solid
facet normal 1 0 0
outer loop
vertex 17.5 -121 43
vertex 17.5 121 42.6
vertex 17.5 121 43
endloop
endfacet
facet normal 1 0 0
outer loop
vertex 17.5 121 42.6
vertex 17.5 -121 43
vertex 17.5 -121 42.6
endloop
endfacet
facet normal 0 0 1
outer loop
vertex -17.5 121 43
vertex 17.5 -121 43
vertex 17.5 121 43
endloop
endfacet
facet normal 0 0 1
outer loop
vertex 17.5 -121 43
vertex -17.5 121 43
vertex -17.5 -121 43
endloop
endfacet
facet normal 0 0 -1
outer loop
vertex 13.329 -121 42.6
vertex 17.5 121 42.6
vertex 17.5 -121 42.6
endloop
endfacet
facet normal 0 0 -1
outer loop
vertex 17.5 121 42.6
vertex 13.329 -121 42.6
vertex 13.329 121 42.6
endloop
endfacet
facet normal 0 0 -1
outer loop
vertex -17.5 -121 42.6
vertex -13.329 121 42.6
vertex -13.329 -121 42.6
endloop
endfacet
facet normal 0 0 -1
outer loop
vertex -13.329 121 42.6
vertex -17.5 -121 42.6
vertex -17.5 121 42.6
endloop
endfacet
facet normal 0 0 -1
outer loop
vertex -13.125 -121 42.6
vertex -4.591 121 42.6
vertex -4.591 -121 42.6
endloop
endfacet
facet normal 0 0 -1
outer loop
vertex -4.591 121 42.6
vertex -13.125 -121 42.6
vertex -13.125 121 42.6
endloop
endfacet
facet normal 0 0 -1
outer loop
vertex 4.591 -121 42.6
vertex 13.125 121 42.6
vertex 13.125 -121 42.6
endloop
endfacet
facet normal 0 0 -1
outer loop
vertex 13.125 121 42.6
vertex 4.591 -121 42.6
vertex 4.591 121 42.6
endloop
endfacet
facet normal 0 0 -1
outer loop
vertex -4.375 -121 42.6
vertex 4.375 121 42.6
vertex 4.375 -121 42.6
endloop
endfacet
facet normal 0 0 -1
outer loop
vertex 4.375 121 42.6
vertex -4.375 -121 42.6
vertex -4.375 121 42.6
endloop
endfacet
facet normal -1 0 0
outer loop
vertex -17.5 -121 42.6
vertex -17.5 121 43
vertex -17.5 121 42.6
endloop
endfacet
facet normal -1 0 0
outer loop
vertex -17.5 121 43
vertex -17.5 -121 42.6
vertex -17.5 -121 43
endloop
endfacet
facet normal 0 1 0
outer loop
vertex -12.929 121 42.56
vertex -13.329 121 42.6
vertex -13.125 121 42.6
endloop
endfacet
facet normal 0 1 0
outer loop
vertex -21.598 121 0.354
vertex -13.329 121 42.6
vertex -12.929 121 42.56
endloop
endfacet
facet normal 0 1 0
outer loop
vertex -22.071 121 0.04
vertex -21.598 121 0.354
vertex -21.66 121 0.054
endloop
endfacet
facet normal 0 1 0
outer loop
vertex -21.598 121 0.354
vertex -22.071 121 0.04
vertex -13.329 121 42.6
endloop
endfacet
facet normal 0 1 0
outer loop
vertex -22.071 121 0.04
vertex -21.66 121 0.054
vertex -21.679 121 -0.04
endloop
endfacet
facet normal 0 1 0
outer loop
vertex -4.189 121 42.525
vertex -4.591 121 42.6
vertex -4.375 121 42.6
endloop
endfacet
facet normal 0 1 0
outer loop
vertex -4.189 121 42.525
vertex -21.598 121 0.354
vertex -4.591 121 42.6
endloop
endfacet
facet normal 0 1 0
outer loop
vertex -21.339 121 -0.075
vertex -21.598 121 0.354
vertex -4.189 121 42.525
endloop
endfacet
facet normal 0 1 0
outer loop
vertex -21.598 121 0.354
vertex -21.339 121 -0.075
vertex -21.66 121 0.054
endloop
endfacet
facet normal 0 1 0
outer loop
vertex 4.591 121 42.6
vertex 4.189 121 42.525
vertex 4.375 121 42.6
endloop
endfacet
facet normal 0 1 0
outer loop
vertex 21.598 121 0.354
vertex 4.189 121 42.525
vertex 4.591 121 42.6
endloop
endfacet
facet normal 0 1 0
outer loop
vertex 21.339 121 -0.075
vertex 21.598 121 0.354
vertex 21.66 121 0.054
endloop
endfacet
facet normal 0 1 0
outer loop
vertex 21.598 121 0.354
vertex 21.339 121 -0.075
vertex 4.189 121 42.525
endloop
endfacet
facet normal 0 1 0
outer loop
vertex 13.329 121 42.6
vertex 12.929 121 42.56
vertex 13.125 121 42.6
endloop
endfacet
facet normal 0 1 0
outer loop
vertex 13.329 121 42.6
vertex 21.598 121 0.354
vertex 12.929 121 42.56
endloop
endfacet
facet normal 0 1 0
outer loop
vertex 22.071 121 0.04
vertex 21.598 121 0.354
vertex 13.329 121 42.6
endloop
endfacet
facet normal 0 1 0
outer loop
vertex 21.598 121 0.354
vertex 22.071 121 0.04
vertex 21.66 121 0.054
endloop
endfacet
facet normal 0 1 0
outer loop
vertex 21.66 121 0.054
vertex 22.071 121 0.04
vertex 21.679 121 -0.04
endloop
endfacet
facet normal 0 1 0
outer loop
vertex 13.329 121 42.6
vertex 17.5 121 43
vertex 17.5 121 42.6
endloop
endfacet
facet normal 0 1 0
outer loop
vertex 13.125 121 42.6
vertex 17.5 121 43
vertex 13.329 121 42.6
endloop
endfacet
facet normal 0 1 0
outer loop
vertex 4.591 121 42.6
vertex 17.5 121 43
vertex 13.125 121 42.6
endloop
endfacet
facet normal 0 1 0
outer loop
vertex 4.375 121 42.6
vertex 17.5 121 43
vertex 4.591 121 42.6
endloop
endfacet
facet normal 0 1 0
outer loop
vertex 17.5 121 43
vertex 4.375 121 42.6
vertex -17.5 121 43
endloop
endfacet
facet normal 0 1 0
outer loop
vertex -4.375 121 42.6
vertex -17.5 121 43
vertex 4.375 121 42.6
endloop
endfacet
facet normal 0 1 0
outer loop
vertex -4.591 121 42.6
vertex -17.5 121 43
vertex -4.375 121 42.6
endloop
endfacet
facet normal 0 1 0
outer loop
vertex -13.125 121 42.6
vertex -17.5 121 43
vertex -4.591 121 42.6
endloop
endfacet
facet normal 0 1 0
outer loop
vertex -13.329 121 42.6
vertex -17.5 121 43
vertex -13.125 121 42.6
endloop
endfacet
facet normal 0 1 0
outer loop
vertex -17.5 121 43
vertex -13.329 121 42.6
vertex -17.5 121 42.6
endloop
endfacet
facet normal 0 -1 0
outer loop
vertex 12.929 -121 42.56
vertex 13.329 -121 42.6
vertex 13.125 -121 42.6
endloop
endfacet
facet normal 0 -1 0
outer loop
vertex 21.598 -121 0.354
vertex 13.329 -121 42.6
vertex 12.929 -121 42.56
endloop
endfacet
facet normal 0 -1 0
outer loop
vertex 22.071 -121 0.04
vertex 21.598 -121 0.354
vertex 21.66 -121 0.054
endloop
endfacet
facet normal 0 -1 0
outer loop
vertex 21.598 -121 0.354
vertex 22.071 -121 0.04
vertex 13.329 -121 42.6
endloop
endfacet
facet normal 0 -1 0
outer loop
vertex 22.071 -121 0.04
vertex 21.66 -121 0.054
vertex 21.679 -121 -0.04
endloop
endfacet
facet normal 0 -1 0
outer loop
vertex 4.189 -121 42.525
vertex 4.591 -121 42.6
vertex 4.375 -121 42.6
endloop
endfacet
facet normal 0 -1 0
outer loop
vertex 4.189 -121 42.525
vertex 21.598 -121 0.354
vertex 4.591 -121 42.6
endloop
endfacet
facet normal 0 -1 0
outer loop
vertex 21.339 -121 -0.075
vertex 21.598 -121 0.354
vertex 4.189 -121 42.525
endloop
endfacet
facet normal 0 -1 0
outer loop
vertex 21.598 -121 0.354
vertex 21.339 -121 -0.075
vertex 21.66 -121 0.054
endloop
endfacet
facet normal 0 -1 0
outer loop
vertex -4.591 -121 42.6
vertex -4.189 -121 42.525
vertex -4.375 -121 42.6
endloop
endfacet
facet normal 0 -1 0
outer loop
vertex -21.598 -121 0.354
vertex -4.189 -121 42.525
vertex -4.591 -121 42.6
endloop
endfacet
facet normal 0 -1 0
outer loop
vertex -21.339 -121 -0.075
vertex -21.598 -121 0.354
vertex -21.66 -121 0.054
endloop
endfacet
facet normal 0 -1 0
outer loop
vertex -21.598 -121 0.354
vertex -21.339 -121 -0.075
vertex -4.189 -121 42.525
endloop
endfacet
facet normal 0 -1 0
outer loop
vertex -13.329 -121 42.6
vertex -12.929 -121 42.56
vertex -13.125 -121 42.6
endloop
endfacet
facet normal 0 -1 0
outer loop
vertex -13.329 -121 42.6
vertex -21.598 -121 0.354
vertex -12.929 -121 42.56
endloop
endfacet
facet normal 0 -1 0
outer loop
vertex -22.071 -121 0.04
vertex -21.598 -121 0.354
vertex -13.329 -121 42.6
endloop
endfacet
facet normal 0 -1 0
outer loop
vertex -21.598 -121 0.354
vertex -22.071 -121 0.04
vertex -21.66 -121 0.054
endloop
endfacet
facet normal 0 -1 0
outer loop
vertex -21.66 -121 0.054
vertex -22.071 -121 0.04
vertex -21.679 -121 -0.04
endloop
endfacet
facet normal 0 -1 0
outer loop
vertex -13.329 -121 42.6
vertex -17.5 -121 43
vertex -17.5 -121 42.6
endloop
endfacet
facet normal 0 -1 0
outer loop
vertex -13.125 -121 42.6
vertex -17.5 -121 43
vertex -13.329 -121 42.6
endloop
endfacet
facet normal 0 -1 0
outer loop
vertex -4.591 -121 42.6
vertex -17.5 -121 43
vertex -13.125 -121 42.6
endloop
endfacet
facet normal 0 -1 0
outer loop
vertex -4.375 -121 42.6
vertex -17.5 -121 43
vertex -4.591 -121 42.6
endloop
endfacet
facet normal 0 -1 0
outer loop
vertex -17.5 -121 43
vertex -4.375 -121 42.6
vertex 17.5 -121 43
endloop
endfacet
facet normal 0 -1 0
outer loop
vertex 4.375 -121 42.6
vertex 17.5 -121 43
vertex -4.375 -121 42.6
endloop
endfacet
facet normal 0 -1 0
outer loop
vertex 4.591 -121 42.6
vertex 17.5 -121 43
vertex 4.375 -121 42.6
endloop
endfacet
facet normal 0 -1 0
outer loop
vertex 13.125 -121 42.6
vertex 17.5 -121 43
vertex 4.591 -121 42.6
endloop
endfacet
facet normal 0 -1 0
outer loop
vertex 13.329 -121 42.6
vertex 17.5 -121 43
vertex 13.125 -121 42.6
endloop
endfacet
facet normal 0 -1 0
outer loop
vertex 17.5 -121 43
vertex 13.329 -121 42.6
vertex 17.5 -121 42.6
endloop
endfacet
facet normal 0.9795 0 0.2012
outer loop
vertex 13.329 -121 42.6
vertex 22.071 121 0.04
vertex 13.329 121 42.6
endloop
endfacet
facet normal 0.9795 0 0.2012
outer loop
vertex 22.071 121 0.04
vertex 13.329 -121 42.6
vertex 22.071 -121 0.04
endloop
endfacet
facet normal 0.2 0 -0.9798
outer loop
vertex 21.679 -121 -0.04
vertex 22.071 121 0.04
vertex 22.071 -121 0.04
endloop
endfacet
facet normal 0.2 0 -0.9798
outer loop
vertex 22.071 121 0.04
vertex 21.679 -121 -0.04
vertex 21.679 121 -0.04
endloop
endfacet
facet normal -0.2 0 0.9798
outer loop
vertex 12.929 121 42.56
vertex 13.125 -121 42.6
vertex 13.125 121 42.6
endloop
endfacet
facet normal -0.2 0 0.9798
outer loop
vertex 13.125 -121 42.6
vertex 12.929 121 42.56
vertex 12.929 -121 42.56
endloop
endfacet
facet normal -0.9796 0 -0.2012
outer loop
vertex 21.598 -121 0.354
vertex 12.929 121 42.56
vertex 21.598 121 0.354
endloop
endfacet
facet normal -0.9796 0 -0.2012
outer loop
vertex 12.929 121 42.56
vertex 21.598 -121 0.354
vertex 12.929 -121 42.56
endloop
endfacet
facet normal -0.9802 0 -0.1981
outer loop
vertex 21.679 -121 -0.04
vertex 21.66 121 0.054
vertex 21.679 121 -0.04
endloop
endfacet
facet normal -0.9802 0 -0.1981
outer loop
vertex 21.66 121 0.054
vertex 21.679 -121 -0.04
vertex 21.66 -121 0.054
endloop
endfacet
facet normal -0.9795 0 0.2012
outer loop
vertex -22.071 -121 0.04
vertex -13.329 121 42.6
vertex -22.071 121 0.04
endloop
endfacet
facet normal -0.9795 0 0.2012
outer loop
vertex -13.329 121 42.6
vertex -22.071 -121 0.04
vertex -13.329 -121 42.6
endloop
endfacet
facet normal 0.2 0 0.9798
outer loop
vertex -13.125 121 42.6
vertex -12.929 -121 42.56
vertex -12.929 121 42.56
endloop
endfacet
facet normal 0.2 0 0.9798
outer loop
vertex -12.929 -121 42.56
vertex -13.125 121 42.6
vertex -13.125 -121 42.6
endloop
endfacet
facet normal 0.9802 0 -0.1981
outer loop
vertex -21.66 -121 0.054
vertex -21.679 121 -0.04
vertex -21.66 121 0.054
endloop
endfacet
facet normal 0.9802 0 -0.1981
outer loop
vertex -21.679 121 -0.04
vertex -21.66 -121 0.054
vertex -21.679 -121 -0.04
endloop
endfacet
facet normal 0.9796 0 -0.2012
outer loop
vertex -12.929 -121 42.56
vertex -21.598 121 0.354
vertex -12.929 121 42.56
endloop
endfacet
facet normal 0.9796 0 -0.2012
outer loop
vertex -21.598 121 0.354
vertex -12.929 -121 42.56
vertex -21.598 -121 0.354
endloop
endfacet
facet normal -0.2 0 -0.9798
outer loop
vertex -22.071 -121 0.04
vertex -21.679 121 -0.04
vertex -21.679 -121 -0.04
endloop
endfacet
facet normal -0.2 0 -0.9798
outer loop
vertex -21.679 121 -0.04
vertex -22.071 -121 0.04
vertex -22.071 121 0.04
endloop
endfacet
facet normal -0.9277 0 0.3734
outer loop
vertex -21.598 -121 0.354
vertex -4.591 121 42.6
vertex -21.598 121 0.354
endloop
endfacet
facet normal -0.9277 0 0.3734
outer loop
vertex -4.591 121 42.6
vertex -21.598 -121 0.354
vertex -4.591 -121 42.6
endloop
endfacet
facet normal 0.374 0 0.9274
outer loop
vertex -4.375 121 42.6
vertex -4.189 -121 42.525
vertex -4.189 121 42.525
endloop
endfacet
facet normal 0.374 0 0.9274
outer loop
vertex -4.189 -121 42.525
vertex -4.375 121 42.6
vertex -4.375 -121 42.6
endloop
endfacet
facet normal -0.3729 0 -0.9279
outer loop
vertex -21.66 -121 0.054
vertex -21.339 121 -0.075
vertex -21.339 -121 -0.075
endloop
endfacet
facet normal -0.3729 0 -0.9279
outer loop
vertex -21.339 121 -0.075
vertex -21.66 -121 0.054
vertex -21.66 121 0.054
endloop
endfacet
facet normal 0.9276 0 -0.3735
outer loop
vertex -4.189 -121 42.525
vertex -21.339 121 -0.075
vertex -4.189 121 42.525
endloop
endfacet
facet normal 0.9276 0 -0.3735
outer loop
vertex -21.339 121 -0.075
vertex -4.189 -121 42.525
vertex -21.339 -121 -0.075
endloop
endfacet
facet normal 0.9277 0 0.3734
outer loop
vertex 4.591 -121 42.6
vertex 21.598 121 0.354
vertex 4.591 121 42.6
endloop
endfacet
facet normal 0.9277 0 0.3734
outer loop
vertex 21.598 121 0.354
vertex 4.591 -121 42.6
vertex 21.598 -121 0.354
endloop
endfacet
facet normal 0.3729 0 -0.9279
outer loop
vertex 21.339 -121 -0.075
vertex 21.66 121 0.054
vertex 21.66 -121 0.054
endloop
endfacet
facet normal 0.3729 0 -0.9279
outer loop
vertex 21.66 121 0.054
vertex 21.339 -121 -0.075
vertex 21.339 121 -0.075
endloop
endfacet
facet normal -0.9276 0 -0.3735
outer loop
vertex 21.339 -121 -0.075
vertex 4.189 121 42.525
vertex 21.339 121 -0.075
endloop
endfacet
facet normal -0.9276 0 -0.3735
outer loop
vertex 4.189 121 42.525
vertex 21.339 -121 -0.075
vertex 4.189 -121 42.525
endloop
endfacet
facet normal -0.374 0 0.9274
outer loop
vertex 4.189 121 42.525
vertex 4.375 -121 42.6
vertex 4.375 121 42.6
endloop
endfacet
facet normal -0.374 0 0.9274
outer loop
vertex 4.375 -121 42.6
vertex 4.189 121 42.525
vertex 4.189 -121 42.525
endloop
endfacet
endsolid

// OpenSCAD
/* Bench dimensions */
// (cm)
bench_length=242.0; // [0:1000]

// (cm)
seating_height=43; // [10:80]

// (cm)
seating_depth=35; // [10:80]

/* Wood */
// http://www.jumbo.ch/fileadmin/user_upload/bilder/services/jumbo_service_total/0714_Decoupe_planches_f.pdf
// (mm)
board_thickness=4; // [1:20]
boards_thickness=board_thickness/10;
feet_height=seating_height-boards_thickness;
// (Surfacic price of board used to build the bench. CHF per square meter. Total price displayed in terminal when file is opened in OpenScad)
board_surfacic_price=19.50; // [0:100]
// kg.m^.3 Total bench weight displayed in terminal when file is opened in OpenScad)
volumetric_mass_density=450; // kg.m^.3



// Feet dimensions

//Top
/* [Hidden] */
feet_top_spacing_ratio=.75; // Top-spacing of feet relative to seating_depth
feet_top_spacing=seating_depth*feet_top_spacing_ratio;
inside_feet_spacing=feet_top_spacing/3;

//Bottom
feet_bottom_spacing=seating_depth*(1+(1-feet_top_spacing_ratio));
inside_feet_bottom_spacing=feet_bottom_spacing-1.75*boards_thickness;

//Lenghts
outside_feet_length_x=(feet_bottom_spacing-feet_top_spacing)/2;
inside_feet_length_x=(inside_feet_bottom_spacing-inside_feet_spacing)/2;

outside_feet_length=sqrt(pow(outside_feet_length_x,2)+pow(feet_height,2));
inside_feet_length=sqrt(pow(inside_feet_length_x,2)+pow(feet_height,2));

outside_feet_angle=atan(feet_height/((feet_bottom_spacing-feet_top_spacing)/2));
inside_feet_angle=atan(feet_height/((inside_feet_bottom_spacing-inside_feet_spacing)/2));



//Seating board
color("yellow")
translate([0,0,(seating_height-boards_thickness/2)])
cube([seating_depth,bench_length,boards_thickness],center=true);


//Feet

// Right outside foot
color("green")
translate([(outside_feet_length_x+feet_top_spacing)/2,0,feet_height/2])
rotate([0,outside_feet_angle,0])
cube([outside_feet_length,bench_length,boards_thickness],center=true);

// Left outside foot
color("red")
translate([-(outside_feet_length_x+feet_top_spacing)/2,0,feet_height/2])
rotate([0,-outside_feet_angle,0])
cube([outside_feet_length,bench_length,boards_thickness],center=true);

// Right inside foot
color("blue")
translate([-(inside_feet_length_x+inside_feet_spacing)/2,0,feet_height/2])
rotate([0,-inside_feet_angle,0])
cube([inside_feet_length,bench_length,boards_thickness],center=true);

// Left inside foot
color("purple")
translate([(inside_feet_length_x+inside_feet_spacing)/2,0,feet_height/2])
rotate([0,inside_feet_angle,0])
cube([inside_feet_length,bench_length,boards_thickness],center=true);

// Cutting
board_width = seating_depth + 2*(outside_feet_length+inside_feet_length);

//translate([feet_bottom_spacing+board_width/2,0,0])
//square([board_width,bench_length],center=true);

//Surface, weight & price
surface = bench_length * board_width / 10000;
price = surface * board_surfacic_price;
volume = surface * boards_thickness /100;
weight = volume * volumetric_mass_density;

echo(Section_m=board_width/100);
echo(Surface_m2=surface);
echo(Price_fr=price);
echo(Weight_kg=weight);
